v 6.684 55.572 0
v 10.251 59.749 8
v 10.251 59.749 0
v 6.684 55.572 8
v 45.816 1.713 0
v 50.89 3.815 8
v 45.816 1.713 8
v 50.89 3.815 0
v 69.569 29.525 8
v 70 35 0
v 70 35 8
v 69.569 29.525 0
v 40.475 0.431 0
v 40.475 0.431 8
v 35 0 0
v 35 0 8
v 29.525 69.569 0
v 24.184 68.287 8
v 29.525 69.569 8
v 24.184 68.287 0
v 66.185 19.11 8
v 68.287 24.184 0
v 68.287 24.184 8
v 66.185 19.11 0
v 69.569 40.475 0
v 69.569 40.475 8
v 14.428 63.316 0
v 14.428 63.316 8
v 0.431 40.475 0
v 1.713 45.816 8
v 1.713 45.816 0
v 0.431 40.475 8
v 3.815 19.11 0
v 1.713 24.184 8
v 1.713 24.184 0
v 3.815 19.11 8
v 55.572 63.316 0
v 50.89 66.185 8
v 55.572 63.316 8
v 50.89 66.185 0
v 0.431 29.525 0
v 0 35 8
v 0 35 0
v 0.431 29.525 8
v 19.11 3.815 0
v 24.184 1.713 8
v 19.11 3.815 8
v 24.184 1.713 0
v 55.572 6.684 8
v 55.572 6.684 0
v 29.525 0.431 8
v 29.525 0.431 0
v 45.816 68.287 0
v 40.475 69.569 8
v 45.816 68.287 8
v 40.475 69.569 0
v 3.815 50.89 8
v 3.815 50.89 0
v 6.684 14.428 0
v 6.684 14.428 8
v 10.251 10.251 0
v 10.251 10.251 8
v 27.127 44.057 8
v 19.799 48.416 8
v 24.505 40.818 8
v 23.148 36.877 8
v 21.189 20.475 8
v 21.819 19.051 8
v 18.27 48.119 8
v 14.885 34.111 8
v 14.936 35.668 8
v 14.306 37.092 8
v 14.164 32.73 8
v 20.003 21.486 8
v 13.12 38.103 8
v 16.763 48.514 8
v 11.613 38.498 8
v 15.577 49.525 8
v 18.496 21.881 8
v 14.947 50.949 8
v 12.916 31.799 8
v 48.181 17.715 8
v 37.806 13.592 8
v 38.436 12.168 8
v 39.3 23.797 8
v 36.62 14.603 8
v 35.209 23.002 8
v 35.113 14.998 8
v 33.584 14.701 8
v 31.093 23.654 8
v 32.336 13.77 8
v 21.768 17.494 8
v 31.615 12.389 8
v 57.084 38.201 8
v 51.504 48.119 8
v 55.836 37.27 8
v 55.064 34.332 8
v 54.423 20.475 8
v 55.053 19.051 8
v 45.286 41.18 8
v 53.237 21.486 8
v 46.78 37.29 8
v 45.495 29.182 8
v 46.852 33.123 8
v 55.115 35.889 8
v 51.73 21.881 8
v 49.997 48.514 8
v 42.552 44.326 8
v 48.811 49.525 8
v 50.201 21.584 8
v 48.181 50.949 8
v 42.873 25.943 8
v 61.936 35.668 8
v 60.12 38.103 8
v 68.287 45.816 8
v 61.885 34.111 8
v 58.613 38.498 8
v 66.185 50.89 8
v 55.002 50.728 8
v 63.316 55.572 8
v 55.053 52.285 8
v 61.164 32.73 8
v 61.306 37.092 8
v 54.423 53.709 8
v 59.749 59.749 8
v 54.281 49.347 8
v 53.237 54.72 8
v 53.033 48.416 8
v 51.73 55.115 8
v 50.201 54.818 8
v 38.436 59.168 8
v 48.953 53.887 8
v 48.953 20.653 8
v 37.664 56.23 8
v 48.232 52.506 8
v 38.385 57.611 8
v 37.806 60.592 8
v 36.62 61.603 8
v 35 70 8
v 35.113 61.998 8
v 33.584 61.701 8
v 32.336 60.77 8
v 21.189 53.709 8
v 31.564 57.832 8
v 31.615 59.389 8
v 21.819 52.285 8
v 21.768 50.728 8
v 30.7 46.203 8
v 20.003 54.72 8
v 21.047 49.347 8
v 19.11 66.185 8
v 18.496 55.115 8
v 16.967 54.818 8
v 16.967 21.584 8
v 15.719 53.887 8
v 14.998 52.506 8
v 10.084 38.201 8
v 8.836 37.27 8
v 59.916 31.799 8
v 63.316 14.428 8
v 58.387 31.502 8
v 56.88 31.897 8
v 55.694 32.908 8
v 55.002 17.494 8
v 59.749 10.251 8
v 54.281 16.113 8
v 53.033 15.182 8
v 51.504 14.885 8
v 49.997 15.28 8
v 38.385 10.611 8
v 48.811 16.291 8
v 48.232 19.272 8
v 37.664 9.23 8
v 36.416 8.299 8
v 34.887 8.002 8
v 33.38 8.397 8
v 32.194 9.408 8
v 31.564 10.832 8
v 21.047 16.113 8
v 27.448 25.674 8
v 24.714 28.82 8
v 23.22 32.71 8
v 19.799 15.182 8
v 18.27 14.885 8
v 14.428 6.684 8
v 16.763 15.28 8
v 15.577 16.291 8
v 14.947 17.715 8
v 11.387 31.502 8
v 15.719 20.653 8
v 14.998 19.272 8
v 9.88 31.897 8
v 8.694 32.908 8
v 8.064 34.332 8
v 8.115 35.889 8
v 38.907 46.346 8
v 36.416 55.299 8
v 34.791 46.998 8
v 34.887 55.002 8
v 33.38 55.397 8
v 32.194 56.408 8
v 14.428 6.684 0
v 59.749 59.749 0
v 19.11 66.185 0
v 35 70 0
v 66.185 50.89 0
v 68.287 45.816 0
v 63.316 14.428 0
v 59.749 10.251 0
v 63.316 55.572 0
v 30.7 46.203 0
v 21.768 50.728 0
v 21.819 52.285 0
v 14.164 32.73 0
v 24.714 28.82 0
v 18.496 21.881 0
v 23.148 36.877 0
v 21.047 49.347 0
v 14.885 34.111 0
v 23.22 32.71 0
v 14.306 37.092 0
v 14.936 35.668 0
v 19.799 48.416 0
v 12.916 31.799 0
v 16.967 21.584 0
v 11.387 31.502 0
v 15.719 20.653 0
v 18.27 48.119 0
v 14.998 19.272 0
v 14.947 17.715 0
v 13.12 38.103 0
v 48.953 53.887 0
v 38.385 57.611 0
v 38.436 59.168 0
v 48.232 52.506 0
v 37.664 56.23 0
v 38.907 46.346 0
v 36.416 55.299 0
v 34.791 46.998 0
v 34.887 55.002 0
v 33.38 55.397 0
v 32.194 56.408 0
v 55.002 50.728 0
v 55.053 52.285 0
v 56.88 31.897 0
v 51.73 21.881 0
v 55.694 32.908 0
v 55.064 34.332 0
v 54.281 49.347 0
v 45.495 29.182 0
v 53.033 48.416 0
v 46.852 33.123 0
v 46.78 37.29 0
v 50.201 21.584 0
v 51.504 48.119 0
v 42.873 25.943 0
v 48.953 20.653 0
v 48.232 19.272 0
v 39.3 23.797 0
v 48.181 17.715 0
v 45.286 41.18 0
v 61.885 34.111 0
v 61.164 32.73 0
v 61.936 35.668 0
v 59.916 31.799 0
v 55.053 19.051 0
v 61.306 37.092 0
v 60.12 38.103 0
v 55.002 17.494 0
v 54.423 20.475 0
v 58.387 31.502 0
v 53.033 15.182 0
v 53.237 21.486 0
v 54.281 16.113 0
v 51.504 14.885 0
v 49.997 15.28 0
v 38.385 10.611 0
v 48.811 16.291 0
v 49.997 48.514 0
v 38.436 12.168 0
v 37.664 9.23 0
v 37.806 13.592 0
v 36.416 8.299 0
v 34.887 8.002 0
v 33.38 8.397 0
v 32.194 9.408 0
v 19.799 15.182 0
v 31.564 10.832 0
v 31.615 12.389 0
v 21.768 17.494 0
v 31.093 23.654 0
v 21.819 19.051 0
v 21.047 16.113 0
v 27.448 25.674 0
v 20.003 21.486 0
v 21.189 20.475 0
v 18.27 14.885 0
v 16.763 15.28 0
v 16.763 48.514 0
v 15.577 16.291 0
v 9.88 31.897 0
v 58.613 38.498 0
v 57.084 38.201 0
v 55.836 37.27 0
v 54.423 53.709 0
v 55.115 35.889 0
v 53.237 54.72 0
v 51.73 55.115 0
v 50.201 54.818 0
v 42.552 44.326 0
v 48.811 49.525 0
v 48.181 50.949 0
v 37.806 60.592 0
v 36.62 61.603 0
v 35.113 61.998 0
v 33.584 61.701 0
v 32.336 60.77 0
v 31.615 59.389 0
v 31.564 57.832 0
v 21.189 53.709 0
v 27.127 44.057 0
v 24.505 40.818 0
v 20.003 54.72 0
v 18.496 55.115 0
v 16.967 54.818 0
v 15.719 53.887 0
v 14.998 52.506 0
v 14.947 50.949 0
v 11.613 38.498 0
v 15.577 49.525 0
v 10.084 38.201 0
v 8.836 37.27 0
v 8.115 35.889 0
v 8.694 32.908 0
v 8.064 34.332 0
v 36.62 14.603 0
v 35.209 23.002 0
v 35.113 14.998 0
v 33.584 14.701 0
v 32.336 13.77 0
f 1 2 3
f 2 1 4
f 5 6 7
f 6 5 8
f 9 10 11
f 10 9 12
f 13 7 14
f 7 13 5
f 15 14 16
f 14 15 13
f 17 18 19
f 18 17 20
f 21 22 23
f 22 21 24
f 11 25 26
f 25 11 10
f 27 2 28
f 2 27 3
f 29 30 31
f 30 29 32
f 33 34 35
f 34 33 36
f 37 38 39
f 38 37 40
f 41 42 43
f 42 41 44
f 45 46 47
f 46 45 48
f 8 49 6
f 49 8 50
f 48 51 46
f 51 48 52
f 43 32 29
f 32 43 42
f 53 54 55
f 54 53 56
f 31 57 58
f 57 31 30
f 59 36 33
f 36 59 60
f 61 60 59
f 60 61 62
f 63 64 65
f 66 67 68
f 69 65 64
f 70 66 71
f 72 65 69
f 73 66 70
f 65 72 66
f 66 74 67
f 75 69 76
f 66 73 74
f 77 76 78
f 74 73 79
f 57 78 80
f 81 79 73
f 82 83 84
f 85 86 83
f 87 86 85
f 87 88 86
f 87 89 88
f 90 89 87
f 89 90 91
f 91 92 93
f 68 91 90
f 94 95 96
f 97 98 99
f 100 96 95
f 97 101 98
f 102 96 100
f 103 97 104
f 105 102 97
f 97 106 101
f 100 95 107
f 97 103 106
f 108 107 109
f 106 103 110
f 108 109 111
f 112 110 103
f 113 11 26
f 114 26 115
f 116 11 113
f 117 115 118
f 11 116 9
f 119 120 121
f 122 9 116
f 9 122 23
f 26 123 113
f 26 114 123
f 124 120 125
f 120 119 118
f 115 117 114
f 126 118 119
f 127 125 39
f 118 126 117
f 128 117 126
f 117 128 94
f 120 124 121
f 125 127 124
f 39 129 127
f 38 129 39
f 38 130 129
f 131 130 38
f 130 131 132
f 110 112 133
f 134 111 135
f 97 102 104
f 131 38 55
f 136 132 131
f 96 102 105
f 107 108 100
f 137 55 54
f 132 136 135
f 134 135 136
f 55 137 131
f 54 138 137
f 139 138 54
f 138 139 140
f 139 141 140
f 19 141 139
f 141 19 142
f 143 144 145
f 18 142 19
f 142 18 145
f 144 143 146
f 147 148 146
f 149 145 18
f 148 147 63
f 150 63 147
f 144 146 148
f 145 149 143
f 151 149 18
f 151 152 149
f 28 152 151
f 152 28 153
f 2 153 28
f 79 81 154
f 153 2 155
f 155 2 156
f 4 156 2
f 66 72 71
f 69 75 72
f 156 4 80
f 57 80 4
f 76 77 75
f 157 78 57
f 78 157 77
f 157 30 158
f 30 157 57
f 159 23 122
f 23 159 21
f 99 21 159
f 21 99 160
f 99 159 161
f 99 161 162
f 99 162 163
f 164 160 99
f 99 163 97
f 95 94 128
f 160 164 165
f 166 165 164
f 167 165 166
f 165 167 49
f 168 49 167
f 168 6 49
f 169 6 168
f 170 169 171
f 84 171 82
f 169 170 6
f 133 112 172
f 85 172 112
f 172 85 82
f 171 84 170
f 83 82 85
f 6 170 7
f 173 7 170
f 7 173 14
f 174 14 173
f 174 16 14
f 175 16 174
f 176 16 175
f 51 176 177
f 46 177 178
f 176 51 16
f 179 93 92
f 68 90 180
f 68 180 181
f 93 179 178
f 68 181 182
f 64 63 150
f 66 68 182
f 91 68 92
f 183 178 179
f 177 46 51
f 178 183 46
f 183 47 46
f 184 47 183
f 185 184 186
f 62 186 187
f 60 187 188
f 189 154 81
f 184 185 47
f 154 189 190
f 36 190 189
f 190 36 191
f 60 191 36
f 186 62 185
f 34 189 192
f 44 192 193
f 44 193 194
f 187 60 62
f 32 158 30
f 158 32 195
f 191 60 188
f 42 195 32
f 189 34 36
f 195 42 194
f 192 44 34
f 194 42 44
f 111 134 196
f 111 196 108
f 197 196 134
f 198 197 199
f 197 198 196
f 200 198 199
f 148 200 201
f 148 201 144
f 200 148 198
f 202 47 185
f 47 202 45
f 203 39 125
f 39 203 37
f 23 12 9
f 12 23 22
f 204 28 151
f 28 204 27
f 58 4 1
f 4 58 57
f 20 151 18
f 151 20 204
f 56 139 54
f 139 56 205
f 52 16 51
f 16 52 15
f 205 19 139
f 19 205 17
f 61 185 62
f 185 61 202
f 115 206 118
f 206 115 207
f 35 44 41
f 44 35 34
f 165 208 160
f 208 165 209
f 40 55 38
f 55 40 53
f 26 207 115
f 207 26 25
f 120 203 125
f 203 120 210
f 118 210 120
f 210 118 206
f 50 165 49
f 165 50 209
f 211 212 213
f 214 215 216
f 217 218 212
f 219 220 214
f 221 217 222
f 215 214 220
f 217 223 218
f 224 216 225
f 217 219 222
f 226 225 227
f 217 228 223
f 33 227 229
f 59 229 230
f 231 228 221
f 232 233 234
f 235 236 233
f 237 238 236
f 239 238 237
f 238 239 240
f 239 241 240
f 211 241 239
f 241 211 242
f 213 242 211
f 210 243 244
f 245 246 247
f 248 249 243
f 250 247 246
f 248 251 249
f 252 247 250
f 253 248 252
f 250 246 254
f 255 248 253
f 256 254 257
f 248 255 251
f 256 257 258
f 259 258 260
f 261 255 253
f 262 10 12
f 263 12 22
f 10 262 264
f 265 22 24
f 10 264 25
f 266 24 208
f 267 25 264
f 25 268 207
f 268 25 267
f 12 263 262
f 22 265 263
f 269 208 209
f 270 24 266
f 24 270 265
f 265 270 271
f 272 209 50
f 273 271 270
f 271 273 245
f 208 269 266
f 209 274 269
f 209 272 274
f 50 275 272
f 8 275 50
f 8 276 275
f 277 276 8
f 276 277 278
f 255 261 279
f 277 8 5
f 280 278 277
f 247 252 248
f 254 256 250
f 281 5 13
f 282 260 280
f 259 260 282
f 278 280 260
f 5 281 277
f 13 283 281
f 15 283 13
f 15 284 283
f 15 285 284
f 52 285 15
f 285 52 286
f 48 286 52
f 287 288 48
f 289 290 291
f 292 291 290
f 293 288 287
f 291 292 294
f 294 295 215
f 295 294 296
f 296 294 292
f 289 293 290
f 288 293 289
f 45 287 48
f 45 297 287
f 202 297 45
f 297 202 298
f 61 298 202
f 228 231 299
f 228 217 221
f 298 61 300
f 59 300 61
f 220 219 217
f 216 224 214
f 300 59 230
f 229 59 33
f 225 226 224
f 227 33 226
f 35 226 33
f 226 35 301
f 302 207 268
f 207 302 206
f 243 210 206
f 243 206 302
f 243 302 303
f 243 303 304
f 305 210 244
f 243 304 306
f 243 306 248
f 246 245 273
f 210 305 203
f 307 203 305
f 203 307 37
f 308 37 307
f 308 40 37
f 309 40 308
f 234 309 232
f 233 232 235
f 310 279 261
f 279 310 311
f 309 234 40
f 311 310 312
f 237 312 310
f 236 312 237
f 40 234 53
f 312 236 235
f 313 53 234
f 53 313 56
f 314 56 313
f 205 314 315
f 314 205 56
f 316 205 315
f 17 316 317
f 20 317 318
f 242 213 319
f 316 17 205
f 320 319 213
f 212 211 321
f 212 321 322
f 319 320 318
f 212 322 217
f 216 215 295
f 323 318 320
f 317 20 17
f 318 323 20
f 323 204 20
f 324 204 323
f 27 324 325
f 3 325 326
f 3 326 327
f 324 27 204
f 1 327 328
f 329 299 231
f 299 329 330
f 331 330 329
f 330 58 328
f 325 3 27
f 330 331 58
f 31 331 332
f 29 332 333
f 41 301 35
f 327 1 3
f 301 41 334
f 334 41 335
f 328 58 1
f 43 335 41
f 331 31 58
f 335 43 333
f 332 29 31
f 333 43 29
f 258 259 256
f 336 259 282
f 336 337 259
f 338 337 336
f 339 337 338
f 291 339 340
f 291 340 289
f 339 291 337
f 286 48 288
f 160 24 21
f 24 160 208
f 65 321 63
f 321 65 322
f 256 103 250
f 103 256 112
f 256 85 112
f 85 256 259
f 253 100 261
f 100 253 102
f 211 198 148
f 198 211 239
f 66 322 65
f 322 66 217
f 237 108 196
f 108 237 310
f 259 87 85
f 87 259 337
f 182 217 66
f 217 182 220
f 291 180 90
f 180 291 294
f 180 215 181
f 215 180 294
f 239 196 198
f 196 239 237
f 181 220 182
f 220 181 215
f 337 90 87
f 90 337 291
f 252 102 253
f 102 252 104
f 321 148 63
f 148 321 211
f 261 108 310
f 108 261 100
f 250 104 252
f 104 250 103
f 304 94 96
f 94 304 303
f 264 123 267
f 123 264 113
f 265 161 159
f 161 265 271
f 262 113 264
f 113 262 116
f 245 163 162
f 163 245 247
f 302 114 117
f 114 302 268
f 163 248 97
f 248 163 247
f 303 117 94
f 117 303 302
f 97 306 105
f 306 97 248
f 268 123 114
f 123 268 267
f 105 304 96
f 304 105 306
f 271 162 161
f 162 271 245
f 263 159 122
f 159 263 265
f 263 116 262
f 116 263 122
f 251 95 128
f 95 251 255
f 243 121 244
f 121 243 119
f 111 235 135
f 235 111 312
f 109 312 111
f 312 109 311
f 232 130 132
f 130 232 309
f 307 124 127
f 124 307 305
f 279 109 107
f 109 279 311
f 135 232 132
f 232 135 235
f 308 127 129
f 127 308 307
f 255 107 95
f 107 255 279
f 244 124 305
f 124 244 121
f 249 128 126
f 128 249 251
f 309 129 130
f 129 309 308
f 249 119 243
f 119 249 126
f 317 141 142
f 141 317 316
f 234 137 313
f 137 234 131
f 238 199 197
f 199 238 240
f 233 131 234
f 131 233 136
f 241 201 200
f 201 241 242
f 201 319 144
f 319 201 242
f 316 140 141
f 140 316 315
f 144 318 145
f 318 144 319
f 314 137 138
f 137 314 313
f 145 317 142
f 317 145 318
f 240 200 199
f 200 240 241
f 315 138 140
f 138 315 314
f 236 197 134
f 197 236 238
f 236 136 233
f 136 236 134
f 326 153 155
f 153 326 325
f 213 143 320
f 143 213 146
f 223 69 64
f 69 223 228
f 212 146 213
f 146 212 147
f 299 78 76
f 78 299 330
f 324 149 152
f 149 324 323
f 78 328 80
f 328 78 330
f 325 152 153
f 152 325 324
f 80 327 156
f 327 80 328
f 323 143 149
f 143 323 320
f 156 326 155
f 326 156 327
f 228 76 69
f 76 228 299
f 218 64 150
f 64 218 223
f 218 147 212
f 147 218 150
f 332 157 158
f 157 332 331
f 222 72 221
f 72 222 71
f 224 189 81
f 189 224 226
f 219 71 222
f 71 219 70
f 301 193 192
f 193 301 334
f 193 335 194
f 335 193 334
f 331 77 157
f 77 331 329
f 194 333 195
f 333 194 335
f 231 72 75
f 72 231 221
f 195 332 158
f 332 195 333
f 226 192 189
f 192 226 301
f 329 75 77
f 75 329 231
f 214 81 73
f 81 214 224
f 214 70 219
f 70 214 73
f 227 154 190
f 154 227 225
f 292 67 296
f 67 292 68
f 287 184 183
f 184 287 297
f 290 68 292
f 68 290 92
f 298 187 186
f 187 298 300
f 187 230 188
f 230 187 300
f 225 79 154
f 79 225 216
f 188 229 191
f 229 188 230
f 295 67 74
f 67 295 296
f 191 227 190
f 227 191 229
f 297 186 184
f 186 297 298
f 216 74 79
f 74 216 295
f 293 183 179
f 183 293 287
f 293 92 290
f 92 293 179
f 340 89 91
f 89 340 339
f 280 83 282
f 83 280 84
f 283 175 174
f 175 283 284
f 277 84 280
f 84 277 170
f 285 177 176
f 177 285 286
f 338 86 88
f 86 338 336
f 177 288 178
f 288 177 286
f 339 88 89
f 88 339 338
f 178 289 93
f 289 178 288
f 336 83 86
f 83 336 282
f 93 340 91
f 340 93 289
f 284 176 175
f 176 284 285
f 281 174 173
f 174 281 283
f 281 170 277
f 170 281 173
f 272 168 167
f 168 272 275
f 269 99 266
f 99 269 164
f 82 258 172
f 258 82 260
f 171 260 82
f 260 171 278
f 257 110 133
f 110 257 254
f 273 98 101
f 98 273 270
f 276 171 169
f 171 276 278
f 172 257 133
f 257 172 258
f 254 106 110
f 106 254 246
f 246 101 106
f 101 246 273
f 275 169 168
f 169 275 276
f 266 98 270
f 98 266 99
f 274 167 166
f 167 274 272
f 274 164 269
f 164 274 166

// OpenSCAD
$fn = 32;

// ----------------------------------------------------------------------
// Spacer plate: round flange R35, 8 bolts
// ----------------------------------------------------------------------

// --- parameters (mm) ---
bore_r = 12;              // centre bore radius
bolt_r = 3.5;             // bolt hole radius
plate_t = 8;              // plate thickness, Z (extrusion height)
flange_r = 35;            // flange radius
n_bolt = 8;               // bolt hole count
ring_r = 23.5;            // bolt circle radius

profile = [[70, 35], [69.569, 40.475], [68.287, 45.816], [66.185, 50.89], [63.316, 55.572], [59.749, 59.749], [55.572, 63.316], [50.89, 66.185], [45.816, 68.287], [40.475, 69.569], [35, 70], [29.525, 69.569], [24.184, 68.287], [19.11, 66.185], [14.428, 63.316], [10.251, 59.749], [6.684, 55.572], [3.815, 50.89], [1.713, 45.816], [0.431, 40.475], [0, 35], [0.431, 29.525], [1.713, 24.184], [3.815, 19.11], [6.684, 14.428], [10.251, 10.251], [14.428, 6.684], [19.11, 3.815], [24.184, 1.713], [29.525, 0.431], [35, 0], [40.475, 0.431], [45.816, 1.713], [50.89, 3.815], [55.572, 6.684], [59.749, 10.251], [63.316, 14.428], [66.185, 19.11], [68.287, 24.184], [69.569, 29.525]];  // primary outline, 40 points, counter clockwise
void_1 = [[46.78, 37.29], [45.286, 41.18], [42.552, 44.326], [38.907, 46.346], [34.791, 46.998], [30.7, 46.203], [27.127, 44.057], [24.505, 40.818], [23.148, 36.877], [23.22, 32.71], [24.714, 28.82], [27.448, 25.674], [31.093, 23.654], [35.209, 23.002], [39.3, 23.797], [42.873, 25.943], [45.495, 29.182], [46.852, 33.123]];  // centre bore, 18 points
void_2 = [[61.936, 35.668], [61.306, 37.092], [60.12, 38.103], [58.613, 38.498], [57.084, 38.201], [55.836, 37.27], [55.115, 35.889], [55.064, 34.332], [55.694, 32.908], [56.88, 31.897], [58.387, 31.502], [59.916, 31.799], [61.164, 32.73], [61.885, 34.111]];  // bolt hole 1, 14 points
void_3 = [[55.053, 52.285], [54.423, 53.709], [53.237, 54.72], [51.73, 55.115], [50.201, 54.818], [48.953, 53.887], [48.232, 52.506], [48.181, 50.949], [48.811, 49.525], [49.997, 48.514], [51.504, 48.119], [53.033, 48.416], [54.281, 49.347], [55.002, 50.728]];  // bolt hole 2, 14 points
void_4 = [[38.436, 59.168], [37.806, 60.592], [36.62, 61.603], [35.113, 61.998], [33.584, 61.701], [32.336, 60.77], [31.615, 59.389], [31.564, 57.832], [32.194, 56.408], [33.38, 55.397], [34.887, 55.002], [36.416, 55.299], [37.664, 56.23], [38.385, 57.611]];  // bolt hole 3, 14 points
void_5 = [[21.819, 52.285], [21.189, 53.709], [20.003, 54.72], [18.496, 55.115], [16.967, 54.818], [15.719, 53.887], [14.998, 52.506], [14.947, 50.949], [15.577, 49.525], [16.763, 48.514], [18.27, 48.119], [19.799, 48.416], [21.047, 49.347], [21.768, 50.728]];  // bolt hole 4, 14 points
void_6 = [[14.936, 35.668], [14.306, 37.092], [13.12, 38.103], [11.613, 38.498], [10.084, 38.201], [8.836, 37.27], [8.115, 35.889], [8.064, 34.332], [8.694, 32.908], [9.88, 31.897], [11.387, 31.502], [12.916, 31.799], [14.164, 32.73], [14.885, 34.111]];  // bolt hole 5, 14 points
void_7 = [[21.819, 19.051], [21.189, 20.475], [20.003, 21.486], [18.496, 21.881], [16.967, 21.584], [15.719, 20.653], [14.998, 19.272], [14.947, 17.715], [15.577, 16.291], [16.763, 15.28], [18.27, 14.885], [19.799, 15.182], [21.047, 16.113], [21.768, 17.494]];  // bolt hole 6, 14 points
void_8 = [[38.436, 12.168], [37.806, 13.592], [36.62, 14.603], [35.113, 14.998], [33.584, 14.701], [32.336, 13.77], [31.615, 12.389], [31.564, 10.832], [32.194, 9.408], [33.38, 8.397], [34.887, 8.002], [36.416, 8.299], [37.664, 9.23], [38.385, 10.611]];  // bolt hole 7, 14 points
void_9 = [[55.053, 19.051], [54.423, 20.475], [53.237, 21.486], [51.73, 21.881], [50.201, 21.584], [48.953, 20.653], [48.232, 19.272], [48.181, 17.715], [48.811, 16.291], [49.997, 15.28], [51.504, 14.885], [53.033, 15.182], [54.281, 16.113], [55.002, 17.494]];  // bolt hole 8, 14 points

// --- the one profile operation ---
difference() {
  linear_extrude(height = plate_t) polygon(points = profile);
  translate([0, 0, -1])
    linear_extrude(height = plate_t + 2) polygon(points = void_1);
  translate([0, 0, -1])
    linear_extrude(height = plate_t + 2) polygon(points = void_2);
  translate([0, 0, -1])
    linear_extrude(height = plate_t + 2) polygon(points = void_3);
  translate([0, 0, -1])
    linear_extrude(height = plate_t + 2) polygon(points = void_4);
  translate([0, 0, -1])
    linear_extrude(height = plate_t + 2) polygon(points = void_5);
  translate([0, 0, -1])
    linear_extrude(height = plate_t + 2) polygon(points = void_6);
  translate([0, 0, -1])
    linear_extrude(height = plate_t + 2) polygon(points = void_7);
  translate([0, 0, -1])
    linear_extrude(height = plate_t + 2) polygon(points = void_8);
  translate([0, 0, -1])
    linear_extrude(height = plate_t + 2) polygon(points = void_9);
}
